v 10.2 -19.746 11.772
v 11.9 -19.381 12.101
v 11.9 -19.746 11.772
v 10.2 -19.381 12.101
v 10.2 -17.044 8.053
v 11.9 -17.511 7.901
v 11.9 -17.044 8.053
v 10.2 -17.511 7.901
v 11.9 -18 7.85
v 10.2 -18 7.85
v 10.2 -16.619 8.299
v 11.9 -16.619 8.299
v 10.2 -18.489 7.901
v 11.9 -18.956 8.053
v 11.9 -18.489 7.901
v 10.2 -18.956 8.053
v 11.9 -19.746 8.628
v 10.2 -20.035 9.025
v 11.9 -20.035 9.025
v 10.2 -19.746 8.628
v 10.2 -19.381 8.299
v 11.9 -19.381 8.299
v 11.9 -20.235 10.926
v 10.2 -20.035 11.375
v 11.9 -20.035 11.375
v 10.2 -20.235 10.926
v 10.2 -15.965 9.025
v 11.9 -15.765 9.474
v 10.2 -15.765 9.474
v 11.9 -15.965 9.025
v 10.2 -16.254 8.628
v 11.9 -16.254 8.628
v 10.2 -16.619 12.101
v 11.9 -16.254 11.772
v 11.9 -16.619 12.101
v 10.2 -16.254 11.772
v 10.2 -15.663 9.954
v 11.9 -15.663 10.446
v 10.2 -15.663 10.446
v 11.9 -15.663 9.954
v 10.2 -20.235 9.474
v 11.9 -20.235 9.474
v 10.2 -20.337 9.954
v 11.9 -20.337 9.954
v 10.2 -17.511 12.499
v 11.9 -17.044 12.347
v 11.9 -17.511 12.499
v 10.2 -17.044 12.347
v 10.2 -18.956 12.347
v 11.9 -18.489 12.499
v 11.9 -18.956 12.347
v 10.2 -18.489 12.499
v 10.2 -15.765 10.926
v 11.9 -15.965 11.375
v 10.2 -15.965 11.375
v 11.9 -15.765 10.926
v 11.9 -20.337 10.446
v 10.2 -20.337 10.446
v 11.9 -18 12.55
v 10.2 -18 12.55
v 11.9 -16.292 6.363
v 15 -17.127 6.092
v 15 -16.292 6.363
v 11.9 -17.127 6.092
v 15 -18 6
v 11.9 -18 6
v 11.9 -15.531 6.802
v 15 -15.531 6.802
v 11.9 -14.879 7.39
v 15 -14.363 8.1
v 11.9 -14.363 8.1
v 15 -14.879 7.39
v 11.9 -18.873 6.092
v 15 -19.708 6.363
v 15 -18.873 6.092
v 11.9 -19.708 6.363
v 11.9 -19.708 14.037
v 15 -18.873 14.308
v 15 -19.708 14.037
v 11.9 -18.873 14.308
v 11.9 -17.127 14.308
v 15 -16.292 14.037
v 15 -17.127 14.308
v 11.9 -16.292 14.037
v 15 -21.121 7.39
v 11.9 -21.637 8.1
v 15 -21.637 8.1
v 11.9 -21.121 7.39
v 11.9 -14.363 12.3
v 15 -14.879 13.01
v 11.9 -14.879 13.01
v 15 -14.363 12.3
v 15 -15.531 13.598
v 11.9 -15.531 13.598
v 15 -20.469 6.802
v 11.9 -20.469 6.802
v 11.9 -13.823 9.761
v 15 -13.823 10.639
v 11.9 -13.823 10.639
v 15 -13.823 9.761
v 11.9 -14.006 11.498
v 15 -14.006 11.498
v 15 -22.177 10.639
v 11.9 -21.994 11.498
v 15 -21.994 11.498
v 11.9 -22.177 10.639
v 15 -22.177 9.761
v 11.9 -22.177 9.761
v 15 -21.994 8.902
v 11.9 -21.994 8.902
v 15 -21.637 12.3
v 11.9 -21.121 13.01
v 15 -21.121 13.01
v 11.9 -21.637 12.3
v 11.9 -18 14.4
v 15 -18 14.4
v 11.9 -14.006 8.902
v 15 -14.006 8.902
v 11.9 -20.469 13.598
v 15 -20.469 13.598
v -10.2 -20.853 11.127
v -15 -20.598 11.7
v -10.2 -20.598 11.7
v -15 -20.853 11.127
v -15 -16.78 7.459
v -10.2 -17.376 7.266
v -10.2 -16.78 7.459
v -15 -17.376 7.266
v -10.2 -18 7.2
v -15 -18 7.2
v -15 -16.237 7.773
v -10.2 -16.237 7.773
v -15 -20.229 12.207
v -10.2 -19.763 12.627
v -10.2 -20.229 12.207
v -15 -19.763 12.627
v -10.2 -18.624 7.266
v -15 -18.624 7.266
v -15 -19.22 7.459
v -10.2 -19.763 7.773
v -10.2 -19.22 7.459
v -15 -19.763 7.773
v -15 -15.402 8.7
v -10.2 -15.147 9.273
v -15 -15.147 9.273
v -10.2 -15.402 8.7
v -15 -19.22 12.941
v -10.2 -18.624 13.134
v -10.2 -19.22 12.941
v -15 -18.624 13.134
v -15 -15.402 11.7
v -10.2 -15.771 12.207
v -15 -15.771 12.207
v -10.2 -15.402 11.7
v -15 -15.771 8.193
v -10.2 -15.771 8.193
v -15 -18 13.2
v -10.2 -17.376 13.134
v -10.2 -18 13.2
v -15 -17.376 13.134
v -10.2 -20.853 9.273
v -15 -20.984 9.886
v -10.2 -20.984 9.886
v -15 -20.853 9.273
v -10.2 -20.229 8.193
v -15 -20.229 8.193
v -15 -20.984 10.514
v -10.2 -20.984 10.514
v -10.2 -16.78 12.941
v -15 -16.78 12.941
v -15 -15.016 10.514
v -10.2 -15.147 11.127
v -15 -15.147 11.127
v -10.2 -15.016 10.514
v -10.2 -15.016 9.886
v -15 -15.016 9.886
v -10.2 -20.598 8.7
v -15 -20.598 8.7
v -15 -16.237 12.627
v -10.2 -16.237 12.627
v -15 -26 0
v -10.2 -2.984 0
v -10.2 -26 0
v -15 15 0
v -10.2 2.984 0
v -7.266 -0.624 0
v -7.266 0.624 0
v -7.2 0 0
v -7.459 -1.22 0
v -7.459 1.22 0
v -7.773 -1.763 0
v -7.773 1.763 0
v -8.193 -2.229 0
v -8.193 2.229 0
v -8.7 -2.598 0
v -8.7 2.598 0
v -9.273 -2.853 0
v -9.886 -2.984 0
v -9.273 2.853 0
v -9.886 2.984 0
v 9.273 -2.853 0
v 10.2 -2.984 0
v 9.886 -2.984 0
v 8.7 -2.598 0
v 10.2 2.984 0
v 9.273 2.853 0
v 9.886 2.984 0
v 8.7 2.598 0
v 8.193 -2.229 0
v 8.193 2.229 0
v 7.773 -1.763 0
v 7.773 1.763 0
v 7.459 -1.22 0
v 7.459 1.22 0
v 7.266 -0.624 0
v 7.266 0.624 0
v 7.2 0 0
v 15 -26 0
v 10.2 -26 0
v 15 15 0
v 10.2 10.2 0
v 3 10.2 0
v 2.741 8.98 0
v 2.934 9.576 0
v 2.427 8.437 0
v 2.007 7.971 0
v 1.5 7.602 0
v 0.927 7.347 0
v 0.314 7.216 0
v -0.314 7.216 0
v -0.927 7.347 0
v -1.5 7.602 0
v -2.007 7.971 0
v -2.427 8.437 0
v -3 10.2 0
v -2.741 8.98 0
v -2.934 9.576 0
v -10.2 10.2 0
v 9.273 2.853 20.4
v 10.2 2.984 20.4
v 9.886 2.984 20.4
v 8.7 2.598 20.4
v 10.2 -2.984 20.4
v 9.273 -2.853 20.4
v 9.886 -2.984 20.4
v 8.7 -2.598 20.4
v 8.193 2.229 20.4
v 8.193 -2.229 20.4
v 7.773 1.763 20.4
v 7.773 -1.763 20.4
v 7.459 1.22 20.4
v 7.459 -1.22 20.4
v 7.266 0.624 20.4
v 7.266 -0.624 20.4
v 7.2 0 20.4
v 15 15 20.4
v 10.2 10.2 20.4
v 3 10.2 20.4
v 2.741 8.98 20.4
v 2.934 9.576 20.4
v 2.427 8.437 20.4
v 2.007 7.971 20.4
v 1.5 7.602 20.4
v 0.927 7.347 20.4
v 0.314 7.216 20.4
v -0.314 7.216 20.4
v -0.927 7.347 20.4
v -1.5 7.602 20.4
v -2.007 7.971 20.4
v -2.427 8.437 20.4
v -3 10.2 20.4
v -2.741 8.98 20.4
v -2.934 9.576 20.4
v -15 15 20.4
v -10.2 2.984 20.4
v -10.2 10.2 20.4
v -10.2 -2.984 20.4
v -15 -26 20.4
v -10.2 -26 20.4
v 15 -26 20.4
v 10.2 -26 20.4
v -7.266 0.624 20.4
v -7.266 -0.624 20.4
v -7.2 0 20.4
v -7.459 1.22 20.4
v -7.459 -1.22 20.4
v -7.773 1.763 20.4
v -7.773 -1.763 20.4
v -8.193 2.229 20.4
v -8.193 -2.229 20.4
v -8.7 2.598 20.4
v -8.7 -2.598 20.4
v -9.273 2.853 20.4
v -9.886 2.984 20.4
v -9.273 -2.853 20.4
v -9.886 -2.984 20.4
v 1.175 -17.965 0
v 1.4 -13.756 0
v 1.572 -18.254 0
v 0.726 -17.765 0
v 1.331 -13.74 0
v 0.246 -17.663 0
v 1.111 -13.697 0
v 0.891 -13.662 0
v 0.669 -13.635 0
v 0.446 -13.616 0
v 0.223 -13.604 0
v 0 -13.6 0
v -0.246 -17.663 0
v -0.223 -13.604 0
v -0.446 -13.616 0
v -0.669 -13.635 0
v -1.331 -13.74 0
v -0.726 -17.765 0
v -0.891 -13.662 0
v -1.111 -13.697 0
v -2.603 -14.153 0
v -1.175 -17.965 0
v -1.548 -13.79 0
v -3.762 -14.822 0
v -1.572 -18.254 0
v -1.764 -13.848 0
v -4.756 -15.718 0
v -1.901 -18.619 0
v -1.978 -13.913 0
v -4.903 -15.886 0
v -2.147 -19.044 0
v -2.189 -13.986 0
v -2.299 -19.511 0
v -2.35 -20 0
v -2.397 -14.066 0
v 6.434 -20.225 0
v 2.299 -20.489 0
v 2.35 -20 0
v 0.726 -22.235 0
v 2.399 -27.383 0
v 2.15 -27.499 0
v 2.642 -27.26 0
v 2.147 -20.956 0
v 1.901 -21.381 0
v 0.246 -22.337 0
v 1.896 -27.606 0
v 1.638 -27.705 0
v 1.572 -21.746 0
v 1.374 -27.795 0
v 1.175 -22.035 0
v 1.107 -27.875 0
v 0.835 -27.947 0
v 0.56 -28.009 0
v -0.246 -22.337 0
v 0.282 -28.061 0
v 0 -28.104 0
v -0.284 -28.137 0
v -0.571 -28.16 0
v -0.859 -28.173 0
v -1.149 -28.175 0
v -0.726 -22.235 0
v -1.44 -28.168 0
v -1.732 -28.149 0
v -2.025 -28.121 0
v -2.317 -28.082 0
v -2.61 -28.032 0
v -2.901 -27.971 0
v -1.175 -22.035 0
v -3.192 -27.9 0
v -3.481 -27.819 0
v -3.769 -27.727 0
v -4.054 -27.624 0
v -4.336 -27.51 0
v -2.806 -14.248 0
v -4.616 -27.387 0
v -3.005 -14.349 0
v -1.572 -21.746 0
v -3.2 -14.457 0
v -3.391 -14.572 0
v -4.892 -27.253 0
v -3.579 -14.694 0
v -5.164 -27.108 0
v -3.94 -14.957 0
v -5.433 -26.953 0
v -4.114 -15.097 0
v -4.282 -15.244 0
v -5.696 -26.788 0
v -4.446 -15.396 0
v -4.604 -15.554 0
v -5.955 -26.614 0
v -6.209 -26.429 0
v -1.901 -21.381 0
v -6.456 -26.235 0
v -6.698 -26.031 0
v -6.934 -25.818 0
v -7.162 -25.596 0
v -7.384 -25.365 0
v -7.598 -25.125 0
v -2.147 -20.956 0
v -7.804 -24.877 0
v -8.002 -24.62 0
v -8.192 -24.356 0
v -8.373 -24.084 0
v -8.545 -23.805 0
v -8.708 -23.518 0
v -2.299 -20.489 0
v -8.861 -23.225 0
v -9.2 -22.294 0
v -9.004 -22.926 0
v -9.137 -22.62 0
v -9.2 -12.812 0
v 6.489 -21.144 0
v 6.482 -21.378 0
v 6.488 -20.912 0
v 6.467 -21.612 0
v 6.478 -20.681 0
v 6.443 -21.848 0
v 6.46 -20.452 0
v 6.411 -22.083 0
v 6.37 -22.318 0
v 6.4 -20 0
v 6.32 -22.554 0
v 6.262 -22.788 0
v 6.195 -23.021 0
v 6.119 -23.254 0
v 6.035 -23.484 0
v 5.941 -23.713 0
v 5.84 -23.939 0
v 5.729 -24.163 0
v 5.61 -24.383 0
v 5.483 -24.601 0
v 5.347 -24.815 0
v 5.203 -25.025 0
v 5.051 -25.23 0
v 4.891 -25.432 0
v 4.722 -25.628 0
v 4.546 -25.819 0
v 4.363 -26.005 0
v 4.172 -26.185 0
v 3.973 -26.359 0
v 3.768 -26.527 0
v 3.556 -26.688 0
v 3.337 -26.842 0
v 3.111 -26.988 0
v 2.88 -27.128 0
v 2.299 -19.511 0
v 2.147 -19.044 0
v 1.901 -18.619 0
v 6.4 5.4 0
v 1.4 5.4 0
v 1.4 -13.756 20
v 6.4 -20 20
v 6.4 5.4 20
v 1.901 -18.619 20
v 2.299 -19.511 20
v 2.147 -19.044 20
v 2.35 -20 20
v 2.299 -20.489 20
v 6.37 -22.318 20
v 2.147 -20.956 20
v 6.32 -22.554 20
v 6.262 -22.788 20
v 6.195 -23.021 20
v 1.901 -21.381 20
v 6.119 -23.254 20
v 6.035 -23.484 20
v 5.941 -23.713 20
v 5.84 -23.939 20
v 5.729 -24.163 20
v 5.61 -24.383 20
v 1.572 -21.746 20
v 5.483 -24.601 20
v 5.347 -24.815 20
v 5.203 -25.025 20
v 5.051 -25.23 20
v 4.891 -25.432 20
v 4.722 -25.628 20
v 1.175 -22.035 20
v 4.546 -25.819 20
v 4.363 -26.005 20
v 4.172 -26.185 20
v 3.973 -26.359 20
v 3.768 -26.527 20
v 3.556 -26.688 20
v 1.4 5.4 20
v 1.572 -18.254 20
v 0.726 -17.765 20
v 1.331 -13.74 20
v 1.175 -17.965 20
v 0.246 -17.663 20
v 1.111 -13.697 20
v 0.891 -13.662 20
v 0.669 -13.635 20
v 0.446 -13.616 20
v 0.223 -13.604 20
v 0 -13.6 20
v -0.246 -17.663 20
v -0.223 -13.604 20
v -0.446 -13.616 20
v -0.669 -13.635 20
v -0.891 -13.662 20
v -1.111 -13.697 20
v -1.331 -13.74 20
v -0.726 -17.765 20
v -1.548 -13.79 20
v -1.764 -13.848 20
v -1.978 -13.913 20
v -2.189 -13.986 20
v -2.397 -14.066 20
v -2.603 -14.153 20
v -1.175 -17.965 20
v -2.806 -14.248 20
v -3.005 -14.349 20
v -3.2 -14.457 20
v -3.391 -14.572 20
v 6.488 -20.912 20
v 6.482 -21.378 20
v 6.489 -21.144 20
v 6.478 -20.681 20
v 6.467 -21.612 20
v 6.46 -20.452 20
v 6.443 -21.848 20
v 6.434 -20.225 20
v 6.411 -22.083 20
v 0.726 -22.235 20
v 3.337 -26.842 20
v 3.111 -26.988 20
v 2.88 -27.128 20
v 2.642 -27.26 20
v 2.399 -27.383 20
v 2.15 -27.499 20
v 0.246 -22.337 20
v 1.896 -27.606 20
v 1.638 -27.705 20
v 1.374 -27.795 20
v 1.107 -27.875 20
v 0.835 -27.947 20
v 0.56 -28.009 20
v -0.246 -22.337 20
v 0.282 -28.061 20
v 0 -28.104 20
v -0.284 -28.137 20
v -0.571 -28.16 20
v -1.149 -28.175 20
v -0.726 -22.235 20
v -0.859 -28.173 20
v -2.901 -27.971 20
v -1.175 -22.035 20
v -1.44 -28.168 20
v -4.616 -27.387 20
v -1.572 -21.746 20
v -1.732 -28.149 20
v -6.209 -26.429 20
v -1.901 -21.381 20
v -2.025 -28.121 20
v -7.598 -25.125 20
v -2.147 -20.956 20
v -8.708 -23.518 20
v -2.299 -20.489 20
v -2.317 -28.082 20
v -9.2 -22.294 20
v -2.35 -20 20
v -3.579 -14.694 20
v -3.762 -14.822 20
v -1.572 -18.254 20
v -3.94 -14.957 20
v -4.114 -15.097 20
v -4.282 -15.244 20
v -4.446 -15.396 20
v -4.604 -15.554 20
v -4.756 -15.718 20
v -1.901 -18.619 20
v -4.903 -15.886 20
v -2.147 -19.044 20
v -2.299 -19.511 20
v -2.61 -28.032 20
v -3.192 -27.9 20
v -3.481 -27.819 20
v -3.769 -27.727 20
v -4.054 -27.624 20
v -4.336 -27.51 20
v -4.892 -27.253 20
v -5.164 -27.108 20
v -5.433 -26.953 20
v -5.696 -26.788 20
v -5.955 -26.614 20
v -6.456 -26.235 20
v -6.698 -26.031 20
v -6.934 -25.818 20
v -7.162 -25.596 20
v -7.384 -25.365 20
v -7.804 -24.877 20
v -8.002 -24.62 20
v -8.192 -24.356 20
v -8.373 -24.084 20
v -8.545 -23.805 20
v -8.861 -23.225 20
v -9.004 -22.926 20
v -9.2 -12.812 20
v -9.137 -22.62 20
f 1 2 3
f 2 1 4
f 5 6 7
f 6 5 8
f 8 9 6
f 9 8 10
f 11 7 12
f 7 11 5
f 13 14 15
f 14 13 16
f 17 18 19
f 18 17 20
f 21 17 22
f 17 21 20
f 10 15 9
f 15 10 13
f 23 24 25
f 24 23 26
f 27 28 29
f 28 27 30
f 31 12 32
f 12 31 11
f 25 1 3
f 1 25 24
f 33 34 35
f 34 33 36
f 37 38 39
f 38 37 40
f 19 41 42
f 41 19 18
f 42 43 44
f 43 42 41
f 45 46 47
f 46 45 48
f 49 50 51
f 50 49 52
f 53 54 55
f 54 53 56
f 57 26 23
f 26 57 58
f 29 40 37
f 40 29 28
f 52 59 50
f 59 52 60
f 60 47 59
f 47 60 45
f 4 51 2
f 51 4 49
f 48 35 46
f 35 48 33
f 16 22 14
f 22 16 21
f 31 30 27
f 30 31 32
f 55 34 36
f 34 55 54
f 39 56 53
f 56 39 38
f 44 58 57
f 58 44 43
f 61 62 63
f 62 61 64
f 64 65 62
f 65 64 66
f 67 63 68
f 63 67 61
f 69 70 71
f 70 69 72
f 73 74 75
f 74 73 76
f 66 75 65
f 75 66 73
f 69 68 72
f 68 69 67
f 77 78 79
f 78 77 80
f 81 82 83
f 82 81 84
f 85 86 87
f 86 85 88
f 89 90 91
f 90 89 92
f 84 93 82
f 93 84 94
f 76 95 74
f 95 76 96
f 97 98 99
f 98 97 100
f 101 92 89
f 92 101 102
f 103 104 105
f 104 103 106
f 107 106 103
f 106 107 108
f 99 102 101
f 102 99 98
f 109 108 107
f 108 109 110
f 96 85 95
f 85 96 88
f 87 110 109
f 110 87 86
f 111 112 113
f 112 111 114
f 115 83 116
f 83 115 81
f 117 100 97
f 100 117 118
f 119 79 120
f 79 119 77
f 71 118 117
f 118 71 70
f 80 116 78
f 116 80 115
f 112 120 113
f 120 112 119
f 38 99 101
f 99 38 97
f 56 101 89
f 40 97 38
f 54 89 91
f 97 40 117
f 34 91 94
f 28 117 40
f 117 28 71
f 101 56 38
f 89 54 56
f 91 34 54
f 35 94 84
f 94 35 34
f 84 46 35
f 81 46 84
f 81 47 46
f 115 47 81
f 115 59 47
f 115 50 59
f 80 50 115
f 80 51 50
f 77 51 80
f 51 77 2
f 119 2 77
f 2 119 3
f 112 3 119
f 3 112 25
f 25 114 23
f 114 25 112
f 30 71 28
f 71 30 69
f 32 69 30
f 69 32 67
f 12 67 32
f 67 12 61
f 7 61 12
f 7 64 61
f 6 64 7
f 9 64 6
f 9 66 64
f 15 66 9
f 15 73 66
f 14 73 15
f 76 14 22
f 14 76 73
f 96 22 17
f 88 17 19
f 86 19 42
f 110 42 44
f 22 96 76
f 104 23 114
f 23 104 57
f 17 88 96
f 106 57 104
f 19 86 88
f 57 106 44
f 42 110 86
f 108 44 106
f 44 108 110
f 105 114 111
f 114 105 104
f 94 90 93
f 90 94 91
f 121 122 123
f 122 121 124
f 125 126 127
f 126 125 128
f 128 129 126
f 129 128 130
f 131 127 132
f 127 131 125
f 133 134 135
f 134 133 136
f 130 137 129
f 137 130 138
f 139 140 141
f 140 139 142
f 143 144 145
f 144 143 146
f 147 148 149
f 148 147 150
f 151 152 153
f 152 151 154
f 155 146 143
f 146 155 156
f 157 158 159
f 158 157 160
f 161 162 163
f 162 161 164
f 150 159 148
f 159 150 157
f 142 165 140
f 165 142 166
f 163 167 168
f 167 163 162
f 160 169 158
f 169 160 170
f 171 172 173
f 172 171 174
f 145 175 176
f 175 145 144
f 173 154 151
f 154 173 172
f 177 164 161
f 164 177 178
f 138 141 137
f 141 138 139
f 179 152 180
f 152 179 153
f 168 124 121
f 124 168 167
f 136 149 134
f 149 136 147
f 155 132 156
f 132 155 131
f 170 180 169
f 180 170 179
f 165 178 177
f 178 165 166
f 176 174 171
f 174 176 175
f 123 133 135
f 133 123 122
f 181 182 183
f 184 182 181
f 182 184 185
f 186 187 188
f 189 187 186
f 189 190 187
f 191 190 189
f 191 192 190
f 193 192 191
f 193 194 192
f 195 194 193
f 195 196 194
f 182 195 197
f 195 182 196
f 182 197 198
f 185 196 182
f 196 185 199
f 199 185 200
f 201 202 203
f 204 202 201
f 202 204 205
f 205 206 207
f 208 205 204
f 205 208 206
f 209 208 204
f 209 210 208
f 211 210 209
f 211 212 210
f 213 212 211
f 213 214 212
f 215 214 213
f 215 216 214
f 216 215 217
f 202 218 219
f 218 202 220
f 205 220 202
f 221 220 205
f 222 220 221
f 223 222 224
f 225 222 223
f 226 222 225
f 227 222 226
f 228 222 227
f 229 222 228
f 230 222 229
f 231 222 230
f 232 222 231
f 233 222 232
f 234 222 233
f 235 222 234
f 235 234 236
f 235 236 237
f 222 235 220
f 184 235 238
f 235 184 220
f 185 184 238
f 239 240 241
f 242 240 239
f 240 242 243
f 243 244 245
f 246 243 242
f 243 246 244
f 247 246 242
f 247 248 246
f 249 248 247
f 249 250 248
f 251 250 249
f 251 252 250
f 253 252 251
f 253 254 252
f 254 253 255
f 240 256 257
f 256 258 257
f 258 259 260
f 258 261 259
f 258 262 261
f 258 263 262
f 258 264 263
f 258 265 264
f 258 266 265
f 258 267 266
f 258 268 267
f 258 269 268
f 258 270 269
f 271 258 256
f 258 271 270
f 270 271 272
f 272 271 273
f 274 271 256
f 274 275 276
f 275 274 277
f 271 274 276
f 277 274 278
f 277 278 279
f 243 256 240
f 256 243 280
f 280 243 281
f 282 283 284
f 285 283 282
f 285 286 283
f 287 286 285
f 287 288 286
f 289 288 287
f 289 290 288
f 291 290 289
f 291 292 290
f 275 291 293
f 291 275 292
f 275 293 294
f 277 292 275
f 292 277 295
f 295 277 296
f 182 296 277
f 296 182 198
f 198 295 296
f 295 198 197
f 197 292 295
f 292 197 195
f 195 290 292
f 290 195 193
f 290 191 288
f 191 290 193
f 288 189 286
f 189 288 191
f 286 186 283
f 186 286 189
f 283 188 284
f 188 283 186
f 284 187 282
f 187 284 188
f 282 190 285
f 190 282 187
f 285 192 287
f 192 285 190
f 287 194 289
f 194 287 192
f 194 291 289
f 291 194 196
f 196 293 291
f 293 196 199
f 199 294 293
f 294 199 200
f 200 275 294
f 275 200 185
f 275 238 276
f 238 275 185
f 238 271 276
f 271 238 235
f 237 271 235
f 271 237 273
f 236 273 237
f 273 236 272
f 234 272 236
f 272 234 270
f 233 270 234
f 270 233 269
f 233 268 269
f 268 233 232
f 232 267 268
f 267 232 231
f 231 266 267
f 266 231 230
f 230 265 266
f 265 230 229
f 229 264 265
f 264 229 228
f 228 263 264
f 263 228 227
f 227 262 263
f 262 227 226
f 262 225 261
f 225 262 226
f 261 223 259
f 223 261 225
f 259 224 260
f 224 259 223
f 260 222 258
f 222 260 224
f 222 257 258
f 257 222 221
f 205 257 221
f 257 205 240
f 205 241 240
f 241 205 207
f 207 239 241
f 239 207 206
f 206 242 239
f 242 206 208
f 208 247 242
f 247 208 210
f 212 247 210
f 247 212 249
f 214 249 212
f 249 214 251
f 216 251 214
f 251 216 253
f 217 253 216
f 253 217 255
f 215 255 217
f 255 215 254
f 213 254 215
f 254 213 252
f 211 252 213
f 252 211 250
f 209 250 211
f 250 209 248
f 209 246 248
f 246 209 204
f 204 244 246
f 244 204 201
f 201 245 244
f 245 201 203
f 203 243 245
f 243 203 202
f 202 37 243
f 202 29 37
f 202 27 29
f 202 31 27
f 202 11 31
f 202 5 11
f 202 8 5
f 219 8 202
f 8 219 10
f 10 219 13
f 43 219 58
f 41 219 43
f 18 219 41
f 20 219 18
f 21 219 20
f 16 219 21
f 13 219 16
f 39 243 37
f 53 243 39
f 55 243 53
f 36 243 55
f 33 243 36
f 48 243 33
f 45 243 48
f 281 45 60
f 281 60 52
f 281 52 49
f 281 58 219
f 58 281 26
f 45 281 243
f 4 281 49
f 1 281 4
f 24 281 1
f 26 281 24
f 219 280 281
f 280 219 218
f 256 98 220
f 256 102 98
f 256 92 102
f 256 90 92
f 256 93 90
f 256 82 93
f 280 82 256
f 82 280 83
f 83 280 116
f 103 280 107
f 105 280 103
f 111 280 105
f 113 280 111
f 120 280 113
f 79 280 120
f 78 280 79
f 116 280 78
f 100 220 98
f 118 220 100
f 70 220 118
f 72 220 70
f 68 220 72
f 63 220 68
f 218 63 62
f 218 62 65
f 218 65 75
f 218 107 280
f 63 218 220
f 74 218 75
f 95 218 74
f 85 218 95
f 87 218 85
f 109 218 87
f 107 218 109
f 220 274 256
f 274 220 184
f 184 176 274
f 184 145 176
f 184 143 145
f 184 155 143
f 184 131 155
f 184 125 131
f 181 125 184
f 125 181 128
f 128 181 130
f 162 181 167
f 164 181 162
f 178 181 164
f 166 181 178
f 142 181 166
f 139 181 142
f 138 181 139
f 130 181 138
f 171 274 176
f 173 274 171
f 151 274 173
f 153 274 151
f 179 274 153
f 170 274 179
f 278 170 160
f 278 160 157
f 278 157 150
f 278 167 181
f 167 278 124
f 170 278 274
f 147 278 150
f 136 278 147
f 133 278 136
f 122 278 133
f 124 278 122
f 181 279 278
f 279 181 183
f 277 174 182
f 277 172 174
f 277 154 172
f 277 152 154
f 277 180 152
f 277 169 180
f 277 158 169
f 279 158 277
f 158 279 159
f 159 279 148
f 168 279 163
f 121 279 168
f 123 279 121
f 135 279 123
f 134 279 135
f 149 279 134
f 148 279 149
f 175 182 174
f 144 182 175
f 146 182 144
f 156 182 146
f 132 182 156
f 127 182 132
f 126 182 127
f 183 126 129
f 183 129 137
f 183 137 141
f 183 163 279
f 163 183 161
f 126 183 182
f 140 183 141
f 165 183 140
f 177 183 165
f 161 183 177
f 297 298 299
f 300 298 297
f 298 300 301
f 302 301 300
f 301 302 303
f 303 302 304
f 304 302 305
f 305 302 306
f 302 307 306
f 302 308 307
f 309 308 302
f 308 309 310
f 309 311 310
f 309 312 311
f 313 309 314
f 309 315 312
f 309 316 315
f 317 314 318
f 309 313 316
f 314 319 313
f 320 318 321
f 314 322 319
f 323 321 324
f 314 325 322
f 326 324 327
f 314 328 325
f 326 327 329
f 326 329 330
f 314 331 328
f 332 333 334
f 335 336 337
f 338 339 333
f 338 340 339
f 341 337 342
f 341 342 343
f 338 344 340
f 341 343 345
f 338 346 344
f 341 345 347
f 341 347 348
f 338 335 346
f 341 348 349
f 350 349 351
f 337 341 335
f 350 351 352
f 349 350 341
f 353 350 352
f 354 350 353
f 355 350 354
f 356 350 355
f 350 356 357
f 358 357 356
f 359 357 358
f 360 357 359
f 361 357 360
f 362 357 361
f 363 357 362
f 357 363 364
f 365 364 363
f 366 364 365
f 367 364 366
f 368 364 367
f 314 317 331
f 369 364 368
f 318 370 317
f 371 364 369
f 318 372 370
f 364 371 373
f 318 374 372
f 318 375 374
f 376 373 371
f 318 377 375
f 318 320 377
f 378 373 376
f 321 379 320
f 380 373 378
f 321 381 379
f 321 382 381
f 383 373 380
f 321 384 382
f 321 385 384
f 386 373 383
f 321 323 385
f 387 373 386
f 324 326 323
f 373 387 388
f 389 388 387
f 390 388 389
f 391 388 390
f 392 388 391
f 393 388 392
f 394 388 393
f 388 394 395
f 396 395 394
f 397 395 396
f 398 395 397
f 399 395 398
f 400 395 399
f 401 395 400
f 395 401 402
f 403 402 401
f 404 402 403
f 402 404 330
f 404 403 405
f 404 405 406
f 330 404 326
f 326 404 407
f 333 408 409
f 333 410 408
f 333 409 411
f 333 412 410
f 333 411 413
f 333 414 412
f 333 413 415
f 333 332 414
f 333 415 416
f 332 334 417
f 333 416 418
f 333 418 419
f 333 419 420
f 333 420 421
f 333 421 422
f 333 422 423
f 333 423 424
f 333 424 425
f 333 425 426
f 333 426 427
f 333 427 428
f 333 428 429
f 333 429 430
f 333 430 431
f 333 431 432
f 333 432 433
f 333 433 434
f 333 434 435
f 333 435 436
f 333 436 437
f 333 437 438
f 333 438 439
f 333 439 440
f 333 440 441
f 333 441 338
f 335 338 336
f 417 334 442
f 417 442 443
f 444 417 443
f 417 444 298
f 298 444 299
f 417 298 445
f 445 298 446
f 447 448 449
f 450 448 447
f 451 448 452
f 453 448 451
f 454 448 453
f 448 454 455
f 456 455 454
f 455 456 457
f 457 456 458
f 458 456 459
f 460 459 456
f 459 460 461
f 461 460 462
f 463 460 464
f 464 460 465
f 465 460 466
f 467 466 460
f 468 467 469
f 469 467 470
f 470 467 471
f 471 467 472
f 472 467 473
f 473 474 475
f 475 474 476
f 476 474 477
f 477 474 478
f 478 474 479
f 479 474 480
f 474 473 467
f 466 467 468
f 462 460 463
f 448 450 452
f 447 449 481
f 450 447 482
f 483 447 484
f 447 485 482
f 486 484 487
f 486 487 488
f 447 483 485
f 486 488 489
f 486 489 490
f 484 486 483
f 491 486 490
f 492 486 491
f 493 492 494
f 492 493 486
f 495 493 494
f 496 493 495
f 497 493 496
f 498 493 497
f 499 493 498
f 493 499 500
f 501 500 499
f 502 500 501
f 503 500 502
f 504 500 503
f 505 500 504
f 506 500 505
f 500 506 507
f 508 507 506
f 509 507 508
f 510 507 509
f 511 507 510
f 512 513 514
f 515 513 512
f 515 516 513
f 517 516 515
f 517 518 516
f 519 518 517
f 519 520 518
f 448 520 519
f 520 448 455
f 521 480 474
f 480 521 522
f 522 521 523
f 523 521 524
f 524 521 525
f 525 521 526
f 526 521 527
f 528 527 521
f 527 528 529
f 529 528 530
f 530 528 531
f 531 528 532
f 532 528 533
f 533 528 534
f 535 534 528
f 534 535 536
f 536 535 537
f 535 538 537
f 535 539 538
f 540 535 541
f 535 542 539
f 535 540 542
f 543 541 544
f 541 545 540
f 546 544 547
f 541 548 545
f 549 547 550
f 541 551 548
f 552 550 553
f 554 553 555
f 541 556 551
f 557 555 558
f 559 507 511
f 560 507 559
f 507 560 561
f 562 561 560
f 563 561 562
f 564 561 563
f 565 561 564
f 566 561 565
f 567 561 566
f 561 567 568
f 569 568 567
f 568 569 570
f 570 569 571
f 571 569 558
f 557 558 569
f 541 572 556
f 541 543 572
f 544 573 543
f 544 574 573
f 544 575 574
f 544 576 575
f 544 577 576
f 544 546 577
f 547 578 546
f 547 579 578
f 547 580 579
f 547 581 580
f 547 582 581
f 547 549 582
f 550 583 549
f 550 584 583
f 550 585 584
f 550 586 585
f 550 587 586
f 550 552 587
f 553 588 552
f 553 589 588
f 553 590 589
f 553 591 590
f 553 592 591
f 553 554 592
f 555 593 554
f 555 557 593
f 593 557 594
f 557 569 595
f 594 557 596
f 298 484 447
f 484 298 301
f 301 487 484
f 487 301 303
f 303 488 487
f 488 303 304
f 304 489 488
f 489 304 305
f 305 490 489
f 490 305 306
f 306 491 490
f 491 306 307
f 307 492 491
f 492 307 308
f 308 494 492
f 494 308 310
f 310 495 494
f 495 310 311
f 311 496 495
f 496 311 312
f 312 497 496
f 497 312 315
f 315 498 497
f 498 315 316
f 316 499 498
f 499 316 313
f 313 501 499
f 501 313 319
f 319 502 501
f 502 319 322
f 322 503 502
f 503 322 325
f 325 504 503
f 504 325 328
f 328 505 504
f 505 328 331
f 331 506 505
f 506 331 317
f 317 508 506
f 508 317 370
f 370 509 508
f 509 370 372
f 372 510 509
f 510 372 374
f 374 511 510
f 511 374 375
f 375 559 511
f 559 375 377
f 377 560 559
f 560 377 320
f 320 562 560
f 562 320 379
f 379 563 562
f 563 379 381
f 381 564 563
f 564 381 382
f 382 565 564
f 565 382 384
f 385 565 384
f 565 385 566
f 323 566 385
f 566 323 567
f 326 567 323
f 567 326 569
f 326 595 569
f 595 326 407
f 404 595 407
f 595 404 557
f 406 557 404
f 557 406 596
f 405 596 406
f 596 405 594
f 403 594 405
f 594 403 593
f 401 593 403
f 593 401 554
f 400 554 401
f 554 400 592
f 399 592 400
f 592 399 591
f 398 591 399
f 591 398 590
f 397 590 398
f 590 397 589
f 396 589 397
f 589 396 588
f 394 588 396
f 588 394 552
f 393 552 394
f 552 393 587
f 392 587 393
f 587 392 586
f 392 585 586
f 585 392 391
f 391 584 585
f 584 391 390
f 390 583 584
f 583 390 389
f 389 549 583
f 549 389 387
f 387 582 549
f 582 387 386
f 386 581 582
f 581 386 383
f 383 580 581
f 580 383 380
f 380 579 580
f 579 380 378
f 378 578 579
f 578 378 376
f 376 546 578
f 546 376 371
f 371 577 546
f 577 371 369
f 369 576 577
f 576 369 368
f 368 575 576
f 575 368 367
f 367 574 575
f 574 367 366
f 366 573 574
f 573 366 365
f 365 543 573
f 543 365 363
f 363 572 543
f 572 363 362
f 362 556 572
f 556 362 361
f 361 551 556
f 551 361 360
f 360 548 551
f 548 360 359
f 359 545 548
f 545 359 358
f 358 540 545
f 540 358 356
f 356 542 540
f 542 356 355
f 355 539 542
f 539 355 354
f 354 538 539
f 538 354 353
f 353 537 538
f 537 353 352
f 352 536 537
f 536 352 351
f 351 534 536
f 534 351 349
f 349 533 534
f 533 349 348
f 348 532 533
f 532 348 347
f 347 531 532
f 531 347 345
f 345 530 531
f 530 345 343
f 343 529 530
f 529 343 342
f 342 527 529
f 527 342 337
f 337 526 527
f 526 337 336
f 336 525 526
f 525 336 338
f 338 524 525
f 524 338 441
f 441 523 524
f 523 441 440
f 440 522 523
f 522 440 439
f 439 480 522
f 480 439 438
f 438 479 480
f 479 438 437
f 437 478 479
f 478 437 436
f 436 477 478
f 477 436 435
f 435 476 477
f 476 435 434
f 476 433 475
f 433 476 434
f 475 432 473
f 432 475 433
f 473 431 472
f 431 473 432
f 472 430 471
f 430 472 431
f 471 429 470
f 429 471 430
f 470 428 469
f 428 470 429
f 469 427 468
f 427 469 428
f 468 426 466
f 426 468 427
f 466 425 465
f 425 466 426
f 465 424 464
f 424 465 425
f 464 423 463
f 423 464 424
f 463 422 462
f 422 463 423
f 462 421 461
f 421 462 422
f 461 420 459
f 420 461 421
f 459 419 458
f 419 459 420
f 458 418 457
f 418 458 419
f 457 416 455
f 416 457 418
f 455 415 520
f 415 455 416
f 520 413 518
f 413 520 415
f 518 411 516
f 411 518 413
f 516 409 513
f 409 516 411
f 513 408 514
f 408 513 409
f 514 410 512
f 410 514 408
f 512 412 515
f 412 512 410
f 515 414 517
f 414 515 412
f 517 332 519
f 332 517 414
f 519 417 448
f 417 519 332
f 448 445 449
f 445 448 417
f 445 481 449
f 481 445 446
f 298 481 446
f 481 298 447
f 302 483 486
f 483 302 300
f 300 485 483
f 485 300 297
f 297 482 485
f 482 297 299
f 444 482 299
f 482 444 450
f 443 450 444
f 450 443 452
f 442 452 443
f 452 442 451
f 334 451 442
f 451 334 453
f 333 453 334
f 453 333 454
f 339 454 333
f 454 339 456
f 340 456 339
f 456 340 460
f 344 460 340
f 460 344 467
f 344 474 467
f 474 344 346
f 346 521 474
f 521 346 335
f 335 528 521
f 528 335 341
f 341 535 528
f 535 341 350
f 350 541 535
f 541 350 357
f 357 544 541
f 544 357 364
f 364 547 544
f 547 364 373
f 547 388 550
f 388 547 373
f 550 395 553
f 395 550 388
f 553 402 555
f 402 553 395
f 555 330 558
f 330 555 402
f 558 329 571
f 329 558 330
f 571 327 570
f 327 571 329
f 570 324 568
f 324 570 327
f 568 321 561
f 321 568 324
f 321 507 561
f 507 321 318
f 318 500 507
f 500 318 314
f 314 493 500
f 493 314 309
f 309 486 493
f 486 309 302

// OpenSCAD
function inch(x) = 25.4*x;

module extrusion_clamp(nozzle_d=0.4) {
    th = 5;
    gap = 2;
    difference() {
        linear_extrude(25, center=true, convexity=10) {
            difference() {
                union() {
                    square([20+2*th, 20+2*th], center=true);
                    square([30+th, 10+th]);
                }
                square([20+nozzle_d, 20+nozzle_d], center=true);
                translate([0, (20-nozzle_d)/2-gap]) square([30+th, gap+nozzle_d]);
            }
            union() {
                delta = 10+nozzle_d/2;
                translate([-delta,   0]) circle(d=6, $fs=nozzle_d/2);
                translate([ delta,   0]) circle(d=6, $fs=nozzle_d/2);
                translate([  0, -delta]) circle(d=6, $fs=nozzle_d/2);
                translate([  0,  delta]) circle(d=6, $fs=nozzle_d/2);
            }
        }
        rotate([-90, 0, 0])
            translate([20+th, 0, -0.1]) {
                cylinder(h=10+th+0.2, d=inch(1/4)+nozzle_d, $fs=nozzle_d/2);
                rotate([0, 0, 30]) cylinder(h=inch(7/32), d=(inch(7/16)+nozzle_d)/cos(30), $fn=6);
            }
    }
}

module extrusion_camclamp(cusp_angle=15, nozzle_d=0.4) {
    th = 5;
    cam_offset = 8;
    outer_w = th + 20 + th;
    outer_l = th + 20 + 2*cam_offset;
    inner_w = 20 + nozzle_d;
    inner_l = inner_w;
    h = max(inner_w, 2*cam_offset);

    m4_close_d = 4.3;
    m4_head_d  = 8.0;
    m4_head_h  = 3.1;
    m4_insert_d = 5.6;
    m4_insert_l = 4.7;
    
    module frame() {
        difference() {
            linear_extrude(h, center=true, convexity=10) {
                difference() {
                    translate([0, (outer_w - outer_l)/2])
                        square([outer_w, outer_l], center=true);
                    translate([0, 0])
                        square([inner_w, inner_l], center=true);
                    translate([0, -(inner_l+2*cam_offset)/2])
                        square([inner_w, 2*cam_offset + 0.1], center=true);
                }
                union() {
                    delta = 10+nozzle_d/2;
                    translate([ delta,   0]) circle(d=6, $fs=nozzle_d/2);
                    translate([-delta,   0]) circle(d=6, $fs=nozzle_d/2);
                    translate([  0,  delta]) circle(d=6, $fs=nozzle_d/2);
                }
            }
            translate([0, -(20/2 + cam_offset), 0]) rotate([0, 90, 0]) {
                cylinder(h=outer_w+0.1, d=m4_close_d+nozzle_d, center=true, $fs=nozzle_d/2);
                translate([0, 0, (outer_w+0.1-m4_head_h)/2])
                    cylinder(h=m4_head_h+0.1, d=m4_head_d+nozzle_d, center=true, $fs=nozzle_d/2);
                translate([0, 0, -(outer_w+0.1-m4_insert_l)/2])
                    cylinder(h=m4_insert_l+1+0.1, d=m4_insert_d+nozzle_d, center=true, $fs=nozzle_d/2);
            }
        }
    }
    
    module cam() {
        lever_l = h + 5;
        nom_r = cam_offset + 3*nozzle_d;
        min_r = cam_offset - 4*nozzle_d;
        max_r = nom_r/cos(cusp_angle);
        cam_profile = [
            for (theta=[0:2:360])
                let(r = (320 < theta || theta <= cusp_angle) ? nom_r/cos(theta) :
                        (cusp_angle < theta && theta <= 180) ? max_r + (min_r - max_r)*(theta-cusp_angle)/(180-cusp_angle) :
                        min_r)
                [r*cos(theta), r*sin(theta)]
        ];
        linear_extrude(inner_w - nozzle_d, convexity=10) {
            difference() {
                union() {
                    polygon(cam_profile);
                    translate([-min_r, -lever_l]) square([th, lever_l]);
                }
                circle(d=m4_close_d+nozzle_d, $fs=nozzle_d/2);
            }
        }
    }
    
    translate([0, 0, h/2]) frame();
    translate([0, -20, 0]) rotate([0, 0, 180]) cam();
}

extrusion_camclamp();
